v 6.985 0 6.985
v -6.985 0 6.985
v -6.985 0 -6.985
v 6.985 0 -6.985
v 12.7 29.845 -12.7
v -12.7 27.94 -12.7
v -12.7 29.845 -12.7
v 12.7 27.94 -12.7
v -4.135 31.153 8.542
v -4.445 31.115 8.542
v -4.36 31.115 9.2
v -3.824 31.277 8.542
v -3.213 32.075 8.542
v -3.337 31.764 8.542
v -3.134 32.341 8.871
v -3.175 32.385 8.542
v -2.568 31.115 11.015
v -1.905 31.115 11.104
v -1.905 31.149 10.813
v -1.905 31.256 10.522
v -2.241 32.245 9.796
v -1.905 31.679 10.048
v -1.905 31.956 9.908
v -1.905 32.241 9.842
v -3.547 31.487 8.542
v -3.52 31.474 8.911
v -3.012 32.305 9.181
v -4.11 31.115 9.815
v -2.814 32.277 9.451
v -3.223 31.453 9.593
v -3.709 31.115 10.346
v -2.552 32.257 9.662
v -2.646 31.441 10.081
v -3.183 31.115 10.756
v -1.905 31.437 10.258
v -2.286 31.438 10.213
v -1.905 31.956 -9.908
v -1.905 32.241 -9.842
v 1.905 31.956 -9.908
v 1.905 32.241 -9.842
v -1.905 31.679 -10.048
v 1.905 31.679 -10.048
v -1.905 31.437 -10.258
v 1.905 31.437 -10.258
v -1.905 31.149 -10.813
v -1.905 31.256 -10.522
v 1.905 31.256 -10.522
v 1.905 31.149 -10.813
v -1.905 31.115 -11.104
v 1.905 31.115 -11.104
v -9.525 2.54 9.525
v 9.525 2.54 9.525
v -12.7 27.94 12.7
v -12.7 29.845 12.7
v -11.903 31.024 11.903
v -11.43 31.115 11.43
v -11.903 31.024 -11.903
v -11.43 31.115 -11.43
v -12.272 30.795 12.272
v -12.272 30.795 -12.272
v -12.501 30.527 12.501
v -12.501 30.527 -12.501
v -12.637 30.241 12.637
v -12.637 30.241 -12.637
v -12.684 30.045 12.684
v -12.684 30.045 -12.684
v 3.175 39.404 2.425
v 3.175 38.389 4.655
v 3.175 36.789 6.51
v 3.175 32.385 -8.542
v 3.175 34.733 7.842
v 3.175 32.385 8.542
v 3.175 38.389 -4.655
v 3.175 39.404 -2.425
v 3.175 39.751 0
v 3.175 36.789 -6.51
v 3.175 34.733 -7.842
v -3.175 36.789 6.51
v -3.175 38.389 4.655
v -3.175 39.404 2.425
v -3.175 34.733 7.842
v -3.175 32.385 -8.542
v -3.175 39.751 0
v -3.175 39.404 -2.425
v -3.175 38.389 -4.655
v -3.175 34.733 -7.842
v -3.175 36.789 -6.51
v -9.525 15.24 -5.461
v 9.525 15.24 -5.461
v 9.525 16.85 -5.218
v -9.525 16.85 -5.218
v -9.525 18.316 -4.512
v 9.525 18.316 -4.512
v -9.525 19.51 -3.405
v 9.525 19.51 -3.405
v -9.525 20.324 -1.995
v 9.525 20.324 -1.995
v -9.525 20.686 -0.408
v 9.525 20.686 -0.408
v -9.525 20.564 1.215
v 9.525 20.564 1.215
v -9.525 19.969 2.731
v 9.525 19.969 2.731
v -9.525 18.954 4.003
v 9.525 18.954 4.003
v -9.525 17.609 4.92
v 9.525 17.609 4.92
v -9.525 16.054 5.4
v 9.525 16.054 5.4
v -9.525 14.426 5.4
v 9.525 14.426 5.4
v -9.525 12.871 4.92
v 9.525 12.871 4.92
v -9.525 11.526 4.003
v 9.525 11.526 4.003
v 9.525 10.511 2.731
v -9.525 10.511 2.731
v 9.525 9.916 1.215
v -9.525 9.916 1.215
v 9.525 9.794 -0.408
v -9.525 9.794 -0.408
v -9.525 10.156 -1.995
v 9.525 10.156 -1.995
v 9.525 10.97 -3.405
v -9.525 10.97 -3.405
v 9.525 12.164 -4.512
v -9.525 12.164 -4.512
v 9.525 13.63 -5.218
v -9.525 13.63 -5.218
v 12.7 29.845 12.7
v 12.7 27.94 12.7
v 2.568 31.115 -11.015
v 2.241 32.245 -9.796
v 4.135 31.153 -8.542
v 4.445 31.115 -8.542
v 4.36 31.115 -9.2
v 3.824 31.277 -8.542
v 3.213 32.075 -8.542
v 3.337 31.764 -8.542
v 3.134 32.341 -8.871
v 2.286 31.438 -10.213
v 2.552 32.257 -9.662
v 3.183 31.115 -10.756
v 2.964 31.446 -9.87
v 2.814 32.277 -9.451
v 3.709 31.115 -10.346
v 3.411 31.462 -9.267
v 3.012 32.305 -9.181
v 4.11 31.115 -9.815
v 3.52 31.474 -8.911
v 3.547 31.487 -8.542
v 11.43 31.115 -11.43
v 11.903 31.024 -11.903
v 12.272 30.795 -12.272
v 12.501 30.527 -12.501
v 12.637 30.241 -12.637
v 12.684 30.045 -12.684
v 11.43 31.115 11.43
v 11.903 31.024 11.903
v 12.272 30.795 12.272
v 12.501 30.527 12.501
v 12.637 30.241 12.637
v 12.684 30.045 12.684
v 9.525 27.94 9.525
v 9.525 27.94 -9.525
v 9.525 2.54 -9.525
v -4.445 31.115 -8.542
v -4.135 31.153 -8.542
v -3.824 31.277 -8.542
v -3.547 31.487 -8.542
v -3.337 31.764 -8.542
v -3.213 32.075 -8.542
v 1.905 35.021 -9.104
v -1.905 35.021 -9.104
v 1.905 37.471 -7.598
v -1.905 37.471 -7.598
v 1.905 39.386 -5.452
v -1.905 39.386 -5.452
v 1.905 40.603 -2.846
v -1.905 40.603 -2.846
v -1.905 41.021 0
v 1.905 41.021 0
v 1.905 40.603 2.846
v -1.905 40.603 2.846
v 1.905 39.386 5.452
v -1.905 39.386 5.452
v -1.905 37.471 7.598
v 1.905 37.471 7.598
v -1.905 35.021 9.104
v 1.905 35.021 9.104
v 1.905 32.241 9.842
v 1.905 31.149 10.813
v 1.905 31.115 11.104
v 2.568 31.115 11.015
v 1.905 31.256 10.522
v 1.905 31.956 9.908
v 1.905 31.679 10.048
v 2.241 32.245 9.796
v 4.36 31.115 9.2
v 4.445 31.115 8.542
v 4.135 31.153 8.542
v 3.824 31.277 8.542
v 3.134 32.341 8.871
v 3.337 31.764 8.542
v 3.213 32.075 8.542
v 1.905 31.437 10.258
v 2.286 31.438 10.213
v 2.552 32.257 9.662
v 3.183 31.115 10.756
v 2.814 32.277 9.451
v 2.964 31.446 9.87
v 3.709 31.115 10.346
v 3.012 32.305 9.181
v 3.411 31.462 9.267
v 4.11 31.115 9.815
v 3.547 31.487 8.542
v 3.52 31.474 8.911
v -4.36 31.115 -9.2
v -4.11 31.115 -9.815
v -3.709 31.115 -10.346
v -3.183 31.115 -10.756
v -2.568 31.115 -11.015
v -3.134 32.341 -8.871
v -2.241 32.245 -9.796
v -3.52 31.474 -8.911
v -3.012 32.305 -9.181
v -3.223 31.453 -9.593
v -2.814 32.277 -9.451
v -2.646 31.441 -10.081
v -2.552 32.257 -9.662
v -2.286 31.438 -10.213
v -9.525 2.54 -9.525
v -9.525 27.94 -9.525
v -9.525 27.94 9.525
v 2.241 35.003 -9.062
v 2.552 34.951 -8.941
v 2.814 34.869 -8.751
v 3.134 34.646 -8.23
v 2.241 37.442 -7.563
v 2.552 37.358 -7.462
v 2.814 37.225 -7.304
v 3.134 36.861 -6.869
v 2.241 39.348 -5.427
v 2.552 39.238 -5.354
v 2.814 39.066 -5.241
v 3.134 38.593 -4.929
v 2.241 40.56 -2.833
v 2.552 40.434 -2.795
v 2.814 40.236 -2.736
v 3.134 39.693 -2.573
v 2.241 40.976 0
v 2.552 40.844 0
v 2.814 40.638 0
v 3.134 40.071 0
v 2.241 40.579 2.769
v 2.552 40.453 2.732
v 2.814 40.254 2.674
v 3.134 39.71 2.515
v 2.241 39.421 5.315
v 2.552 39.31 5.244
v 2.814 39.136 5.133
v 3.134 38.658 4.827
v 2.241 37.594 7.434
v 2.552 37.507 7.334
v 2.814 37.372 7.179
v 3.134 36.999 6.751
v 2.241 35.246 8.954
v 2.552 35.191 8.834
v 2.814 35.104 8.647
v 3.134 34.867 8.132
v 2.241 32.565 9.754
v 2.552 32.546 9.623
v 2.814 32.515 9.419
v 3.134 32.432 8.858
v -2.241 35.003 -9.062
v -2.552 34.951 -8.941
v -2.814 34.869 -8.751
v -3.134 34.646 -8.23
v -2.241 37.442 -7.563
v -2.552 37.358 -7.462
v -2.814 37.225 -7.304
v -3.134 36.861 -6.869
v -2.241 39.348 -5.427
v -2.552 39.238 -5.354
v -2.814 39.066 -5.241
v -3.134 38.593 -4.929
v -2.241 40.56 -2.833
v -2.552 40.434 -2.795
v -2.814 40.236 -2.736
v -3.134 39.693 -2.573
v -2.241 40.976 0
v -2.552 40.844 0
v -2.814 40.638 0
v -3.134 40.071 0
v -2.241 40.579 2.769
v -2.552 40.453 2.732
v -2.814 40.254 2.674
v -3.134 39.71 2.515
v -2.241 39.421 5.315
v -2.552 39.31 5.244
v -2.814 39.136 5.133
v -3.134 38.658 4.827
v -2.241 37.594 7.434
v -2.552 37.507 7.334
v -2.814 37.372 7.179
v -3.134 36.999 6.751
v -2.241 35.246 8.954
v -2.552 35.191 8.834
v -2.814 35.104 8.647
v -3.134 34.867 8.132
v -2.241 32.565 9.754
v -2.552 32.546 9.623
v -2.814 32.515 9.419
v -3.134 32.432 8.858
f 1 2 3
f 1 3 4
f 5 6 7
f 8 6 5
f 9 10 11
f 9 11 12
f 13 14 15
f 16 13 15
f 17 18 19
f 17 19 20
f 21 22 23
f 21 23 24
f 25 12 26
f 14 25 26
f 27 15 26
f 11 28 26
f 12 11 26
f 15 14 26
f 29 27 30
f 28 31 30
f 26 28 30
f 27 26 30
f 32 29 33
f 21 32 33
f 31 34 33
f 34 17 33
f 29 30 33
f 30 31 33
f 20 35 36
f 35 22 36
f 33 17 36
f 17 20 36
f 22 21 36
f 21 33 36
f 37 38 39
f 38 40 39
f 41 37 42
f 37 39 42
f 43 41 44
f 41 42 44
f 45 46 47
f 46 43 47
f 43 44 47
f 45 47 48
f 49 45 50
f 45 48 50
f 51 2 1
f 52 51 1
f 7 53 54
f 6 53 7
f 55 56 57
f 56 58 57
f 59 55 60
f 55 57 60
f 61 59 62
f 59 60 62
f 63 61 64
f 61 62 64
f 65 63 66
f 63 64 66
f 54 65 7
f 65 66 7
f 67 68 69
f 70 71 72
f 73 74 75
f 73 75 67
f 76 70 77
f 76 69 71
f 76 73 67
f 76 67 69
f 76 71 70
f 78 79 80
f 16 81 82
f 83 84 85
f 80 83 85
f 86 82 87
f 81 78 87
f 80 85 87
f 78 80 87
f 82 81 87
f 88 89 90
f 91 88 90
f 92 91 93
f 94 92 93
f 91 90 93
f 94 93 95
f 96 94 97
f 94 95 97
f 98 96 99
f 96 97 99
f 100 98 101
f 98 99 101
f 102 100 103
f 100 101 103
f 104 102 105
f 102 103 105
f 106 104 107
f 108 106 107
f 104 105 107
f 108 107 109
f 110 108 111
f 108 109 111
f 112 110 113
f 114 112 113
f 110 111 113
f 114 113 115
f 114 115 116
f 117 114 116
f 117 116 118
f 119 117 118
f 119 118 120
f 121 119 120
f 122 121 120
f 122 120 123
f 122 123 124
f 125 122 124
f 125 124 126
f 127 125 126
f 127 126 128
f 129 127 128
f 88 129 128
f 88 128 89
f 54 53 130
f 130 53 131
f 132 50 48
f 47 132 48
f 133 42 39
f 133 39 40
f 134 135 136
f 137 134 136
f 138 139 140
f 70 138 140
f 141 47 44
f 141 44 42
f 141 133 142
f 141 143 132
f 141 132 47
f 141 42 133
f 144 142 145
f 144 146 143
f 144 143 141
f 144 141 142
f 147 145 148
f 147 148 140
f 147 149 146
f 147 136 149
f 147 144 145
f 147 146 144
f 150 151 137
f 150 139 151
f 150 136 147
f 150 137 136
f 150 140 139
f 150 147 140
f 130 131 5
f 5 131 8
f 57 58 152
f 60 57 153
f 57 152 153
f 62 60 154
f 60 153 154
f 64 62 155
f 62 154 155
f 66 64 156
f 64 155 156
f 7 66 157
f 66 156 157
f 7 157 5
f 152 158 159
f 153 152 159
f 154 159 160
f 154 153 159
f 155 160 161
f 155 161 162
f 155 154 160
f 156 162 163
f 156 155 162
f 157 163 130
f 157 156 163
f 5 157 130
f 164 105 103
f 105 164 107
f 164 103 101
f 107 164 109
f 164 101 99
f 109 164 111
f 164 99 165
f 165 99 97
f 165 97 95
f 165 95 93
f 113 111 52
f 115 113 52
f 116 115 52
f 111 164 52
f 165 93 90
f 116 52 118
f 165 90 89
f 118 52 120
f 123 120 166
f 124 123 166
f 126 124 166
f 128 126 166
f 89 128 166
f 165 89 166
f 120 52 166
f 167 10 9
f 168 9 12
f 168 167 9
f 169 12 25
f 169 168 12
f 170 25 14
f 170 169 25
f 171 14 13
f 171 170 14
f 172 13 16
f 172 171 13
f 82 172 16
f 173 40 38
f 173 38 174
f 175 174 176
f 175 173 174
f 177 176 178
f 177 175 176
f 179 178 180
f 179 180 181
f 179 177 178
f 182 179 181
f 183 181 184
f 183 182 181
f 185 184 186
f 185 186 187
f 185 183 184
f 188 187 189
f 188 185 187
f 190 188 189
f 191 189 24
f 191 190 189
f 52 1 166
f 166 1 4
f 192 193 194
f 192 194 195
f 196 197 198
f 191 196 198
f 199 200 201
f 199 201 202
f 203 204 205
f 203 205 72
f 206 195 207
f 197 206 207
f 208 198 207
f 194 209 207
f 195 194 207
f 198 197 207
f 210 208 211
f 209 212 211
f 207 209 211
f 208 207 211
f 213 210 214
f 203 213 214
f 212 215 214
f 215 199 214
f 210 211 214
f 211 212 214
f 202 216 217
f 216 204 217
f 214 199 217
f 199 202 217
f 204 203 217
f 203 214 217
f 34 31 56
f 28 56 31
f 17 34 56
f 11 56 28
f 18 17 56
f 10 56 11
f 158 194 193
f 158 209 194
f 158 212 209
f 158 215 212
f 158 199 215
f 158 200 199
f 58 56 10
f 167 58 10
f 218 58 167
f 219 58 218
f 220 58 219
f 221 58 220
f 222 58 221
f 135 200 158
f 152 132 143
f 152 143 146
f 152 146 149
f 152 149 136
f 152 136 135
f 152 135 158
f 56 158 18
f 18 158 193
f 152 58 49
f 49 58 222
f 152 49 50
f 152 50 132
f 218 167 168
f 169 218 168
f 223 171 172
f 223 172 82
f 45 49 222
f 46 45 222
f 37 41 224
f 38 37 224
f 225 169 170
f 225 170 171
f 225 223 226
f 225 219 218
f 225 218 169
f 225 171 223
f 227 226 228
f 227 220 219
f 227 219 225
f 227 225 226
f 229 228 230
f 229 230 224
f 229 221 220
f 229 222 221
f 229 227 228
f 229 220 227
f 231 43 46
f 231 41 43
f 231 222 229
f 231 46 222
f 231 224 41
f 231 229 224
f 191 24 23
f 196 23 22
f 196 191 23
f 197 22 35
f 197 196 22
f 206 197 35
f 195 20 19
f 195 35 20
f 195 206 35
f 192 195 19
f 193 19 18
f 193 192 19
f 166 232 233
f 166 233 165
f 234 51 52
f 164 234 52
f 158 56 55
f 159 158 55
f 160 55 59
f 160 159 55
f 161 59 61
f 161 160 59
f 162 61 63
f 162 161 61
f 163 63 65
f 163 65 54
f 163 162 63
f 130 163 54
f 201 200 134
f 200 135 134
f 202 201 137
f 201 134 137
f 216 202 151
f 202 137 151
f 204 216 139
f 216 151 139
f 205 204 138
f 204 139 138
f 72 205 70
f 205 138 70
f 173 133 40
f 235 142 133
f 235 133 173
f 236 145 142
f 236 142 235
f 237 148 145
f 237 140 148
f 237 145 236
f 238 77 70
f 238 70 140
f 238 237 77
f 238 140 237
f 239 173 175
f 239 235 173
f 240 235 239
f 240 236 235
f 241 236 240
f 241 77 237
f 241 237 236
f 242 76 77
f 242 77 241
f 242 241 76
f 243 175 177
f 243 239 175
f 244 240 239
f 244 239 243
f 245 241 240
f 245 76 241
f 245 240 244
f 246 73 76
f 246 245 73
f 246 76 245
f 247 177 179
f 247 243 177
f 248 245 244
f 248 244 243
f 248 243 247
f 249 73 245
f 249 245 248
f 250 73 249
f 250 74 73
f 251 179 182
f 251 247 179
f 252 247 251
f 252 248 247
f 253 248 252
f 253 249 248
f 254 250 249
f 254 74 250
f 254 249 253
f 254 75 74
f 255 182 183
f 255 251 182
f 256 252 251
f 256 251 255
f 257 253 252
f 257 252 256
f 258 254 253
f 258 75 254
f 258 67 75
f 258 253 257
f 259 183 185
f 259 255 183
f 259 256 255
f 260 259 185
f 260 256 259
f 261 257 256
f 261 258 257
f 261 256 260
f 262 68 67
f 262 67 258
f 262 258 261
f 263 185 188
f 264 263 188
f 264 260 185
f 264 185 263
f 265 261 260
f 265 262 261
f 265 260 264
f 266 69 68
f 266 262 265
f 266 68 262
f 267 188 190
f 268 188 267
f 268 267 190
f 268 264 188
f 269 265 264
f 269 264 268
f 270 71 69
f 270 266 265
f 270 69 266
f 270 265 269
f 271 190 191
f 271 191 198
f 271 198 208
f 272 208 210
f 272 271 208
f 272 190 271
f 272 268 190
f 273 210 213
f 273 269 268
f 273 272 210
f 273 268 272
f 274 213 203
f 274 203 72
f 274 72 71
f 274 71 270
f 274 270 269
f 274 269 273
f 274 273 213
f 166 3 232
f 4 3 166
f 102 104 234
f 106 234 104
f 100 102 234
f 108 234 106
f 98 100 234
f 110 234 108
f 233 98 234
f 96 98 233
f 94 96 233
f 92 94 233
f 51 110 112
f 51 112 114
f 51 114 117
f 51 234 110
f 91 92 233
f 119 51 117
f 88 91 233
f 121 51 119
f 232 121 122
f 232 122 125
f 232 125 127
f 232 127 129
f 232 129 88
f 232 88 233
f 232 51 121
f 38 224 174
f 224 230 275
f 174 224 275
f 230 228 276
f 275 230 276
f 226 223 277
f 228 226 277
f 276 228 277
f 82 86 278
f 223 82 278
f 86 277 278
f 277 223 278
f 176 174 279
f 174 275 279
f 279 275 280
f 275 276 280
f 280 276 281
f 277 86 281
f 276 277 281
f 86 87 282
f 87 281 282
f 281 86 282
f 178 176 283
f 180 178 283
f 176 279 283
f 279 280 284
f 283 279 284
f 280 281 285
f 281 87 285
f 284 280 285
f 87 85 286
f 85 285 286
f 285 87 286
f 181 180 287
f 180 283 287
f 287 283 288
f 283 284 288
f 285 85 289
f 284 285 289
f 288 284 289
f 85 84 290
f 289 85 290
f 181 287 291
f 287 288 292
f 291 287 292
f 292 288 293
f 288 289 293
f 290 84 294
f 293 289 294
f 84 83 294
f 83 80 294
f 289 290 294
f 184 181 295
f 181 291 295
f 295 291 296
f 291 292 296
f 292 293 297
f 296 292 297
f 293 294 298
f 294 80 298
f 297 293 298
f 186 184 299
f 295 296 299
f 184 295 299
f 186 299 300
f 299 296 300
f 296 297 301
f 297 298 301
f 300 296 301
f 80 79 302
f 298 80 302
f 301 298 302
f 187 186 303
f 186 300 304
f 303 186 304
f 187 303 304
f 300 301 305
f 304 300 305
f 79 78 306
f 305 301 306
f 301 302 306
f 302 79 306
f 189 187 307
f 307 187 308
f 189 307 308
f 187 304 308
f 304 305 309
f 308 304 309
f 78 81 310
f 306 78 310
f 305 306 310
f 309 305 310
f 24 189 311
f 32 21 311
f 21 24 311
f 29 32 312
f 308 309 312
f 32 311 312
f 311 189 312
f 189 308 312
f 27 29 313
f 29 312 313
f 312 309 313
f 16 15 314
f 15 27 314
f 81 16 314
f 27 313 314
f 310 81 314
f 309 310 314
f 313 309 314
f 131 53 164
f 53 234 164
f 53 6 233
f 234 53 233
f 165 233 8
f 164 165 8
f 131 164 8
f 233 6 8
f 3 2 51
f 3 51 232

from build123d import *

# Parameters (mm, degrees)
SKETCH1_W           = 19.05
SKETCH1_H           = 19.05
BOSS_EXTRUDE1_DEPTH = 27.94
SKETCH2_W           = 25.4
SKETCH2_H           = 25.4
BOSS_EXTRUDE2_DEPTH = 3.175
SKETCH3_R           = 5.461
CUT_EXTRUDE1_DEPTH  = 41.291237881
SKETCH4_R           = 9.906
BOSS_EXTRUDE3_DEPTH = 3.175
FILLET1_R           = 1.27
CHAMFER1_SIZE       = 2.54


with BuildPart() as part:
    # Sketch1 → Boss-Extrude1 (new body)
    with BuildSketch(Plane(origin=(0, 0, 0), x_dir=(1, 0, 0), z_dir=(0, 1, 0))):
        Rectangle(SKETCH1_W, SKETCH1_H)
    extrude(amount=BOSS_EXTRUDE1_DEPTH)

    # Sketch2 → Boss-Extrude2 (add)
    with BuildSketch(Plane(origin=(0, 27.94, 0), x_dir=(1, 0, 0), z_dir=(0, 1, 0))):
        Rectangle(SKETCH2_W, SKETCH2_H)
    extrude(amount=BOSS_EXTRUDE2_DEPTH)

    # Sketch3 → Cut-Extrude1 (cut, through all)
    with BuildSketch(Plane(origin=(9.525, 0, 0), x_dir=(0, 0, -1), z_dir=(1, 0, 0))):
        with Locations((0, 15.24)):
            Circle(SKETCH3_R)
    extrude(amount=-CUT_EXTRUDE1_DEPTH, mode=Mode.SUBTRACT)

    # Sketch4 → Boss-Extrude3 (add, symmetric)
    with BuildSketch(Plane(origin=(0, 0, 0), x_dir=(0, 0, -1), z_dir=(1, 0, 0))):
        with Locations((0, 31.115)):
            Circle(SKETCH4_R)
    extrude(amount=BOSS_EXTRUDE3_DEPTH, both=True)

    # Fillet1
    fillet1_edges = [part.edges().sort_by_distance(p)[0] for p in [
        (0, 31.115, 12.7),
        (12.7, 31.115, 0),
        (0, 31.115, -12.7),
        (-12.7, 31.115, 0),
        (-3.175, 31.115, 0),
        (0, 31.115, 9.906),
        (0, 31.115, -9.906),
        (3.175, 31.115, 0),
        (-3.175, 41.021, 0),
        (3.175, 41.021, 0),
    ]]
    fillet(fillet1_edges, radius=FILLET1_R)

    # Chamfer1
    chamfer1_edges = [part.edges().sort_by_distance(p)[0] for p in [
        (0, 0, 9.525),
        (-9.525, 0, 0),
        (0, 0, -9.525),
        (9.525, 0, 0),
    ]]
    chamfer(chamfer1_edges, length=CHAMFER1_SIZE)


solid = part.part
